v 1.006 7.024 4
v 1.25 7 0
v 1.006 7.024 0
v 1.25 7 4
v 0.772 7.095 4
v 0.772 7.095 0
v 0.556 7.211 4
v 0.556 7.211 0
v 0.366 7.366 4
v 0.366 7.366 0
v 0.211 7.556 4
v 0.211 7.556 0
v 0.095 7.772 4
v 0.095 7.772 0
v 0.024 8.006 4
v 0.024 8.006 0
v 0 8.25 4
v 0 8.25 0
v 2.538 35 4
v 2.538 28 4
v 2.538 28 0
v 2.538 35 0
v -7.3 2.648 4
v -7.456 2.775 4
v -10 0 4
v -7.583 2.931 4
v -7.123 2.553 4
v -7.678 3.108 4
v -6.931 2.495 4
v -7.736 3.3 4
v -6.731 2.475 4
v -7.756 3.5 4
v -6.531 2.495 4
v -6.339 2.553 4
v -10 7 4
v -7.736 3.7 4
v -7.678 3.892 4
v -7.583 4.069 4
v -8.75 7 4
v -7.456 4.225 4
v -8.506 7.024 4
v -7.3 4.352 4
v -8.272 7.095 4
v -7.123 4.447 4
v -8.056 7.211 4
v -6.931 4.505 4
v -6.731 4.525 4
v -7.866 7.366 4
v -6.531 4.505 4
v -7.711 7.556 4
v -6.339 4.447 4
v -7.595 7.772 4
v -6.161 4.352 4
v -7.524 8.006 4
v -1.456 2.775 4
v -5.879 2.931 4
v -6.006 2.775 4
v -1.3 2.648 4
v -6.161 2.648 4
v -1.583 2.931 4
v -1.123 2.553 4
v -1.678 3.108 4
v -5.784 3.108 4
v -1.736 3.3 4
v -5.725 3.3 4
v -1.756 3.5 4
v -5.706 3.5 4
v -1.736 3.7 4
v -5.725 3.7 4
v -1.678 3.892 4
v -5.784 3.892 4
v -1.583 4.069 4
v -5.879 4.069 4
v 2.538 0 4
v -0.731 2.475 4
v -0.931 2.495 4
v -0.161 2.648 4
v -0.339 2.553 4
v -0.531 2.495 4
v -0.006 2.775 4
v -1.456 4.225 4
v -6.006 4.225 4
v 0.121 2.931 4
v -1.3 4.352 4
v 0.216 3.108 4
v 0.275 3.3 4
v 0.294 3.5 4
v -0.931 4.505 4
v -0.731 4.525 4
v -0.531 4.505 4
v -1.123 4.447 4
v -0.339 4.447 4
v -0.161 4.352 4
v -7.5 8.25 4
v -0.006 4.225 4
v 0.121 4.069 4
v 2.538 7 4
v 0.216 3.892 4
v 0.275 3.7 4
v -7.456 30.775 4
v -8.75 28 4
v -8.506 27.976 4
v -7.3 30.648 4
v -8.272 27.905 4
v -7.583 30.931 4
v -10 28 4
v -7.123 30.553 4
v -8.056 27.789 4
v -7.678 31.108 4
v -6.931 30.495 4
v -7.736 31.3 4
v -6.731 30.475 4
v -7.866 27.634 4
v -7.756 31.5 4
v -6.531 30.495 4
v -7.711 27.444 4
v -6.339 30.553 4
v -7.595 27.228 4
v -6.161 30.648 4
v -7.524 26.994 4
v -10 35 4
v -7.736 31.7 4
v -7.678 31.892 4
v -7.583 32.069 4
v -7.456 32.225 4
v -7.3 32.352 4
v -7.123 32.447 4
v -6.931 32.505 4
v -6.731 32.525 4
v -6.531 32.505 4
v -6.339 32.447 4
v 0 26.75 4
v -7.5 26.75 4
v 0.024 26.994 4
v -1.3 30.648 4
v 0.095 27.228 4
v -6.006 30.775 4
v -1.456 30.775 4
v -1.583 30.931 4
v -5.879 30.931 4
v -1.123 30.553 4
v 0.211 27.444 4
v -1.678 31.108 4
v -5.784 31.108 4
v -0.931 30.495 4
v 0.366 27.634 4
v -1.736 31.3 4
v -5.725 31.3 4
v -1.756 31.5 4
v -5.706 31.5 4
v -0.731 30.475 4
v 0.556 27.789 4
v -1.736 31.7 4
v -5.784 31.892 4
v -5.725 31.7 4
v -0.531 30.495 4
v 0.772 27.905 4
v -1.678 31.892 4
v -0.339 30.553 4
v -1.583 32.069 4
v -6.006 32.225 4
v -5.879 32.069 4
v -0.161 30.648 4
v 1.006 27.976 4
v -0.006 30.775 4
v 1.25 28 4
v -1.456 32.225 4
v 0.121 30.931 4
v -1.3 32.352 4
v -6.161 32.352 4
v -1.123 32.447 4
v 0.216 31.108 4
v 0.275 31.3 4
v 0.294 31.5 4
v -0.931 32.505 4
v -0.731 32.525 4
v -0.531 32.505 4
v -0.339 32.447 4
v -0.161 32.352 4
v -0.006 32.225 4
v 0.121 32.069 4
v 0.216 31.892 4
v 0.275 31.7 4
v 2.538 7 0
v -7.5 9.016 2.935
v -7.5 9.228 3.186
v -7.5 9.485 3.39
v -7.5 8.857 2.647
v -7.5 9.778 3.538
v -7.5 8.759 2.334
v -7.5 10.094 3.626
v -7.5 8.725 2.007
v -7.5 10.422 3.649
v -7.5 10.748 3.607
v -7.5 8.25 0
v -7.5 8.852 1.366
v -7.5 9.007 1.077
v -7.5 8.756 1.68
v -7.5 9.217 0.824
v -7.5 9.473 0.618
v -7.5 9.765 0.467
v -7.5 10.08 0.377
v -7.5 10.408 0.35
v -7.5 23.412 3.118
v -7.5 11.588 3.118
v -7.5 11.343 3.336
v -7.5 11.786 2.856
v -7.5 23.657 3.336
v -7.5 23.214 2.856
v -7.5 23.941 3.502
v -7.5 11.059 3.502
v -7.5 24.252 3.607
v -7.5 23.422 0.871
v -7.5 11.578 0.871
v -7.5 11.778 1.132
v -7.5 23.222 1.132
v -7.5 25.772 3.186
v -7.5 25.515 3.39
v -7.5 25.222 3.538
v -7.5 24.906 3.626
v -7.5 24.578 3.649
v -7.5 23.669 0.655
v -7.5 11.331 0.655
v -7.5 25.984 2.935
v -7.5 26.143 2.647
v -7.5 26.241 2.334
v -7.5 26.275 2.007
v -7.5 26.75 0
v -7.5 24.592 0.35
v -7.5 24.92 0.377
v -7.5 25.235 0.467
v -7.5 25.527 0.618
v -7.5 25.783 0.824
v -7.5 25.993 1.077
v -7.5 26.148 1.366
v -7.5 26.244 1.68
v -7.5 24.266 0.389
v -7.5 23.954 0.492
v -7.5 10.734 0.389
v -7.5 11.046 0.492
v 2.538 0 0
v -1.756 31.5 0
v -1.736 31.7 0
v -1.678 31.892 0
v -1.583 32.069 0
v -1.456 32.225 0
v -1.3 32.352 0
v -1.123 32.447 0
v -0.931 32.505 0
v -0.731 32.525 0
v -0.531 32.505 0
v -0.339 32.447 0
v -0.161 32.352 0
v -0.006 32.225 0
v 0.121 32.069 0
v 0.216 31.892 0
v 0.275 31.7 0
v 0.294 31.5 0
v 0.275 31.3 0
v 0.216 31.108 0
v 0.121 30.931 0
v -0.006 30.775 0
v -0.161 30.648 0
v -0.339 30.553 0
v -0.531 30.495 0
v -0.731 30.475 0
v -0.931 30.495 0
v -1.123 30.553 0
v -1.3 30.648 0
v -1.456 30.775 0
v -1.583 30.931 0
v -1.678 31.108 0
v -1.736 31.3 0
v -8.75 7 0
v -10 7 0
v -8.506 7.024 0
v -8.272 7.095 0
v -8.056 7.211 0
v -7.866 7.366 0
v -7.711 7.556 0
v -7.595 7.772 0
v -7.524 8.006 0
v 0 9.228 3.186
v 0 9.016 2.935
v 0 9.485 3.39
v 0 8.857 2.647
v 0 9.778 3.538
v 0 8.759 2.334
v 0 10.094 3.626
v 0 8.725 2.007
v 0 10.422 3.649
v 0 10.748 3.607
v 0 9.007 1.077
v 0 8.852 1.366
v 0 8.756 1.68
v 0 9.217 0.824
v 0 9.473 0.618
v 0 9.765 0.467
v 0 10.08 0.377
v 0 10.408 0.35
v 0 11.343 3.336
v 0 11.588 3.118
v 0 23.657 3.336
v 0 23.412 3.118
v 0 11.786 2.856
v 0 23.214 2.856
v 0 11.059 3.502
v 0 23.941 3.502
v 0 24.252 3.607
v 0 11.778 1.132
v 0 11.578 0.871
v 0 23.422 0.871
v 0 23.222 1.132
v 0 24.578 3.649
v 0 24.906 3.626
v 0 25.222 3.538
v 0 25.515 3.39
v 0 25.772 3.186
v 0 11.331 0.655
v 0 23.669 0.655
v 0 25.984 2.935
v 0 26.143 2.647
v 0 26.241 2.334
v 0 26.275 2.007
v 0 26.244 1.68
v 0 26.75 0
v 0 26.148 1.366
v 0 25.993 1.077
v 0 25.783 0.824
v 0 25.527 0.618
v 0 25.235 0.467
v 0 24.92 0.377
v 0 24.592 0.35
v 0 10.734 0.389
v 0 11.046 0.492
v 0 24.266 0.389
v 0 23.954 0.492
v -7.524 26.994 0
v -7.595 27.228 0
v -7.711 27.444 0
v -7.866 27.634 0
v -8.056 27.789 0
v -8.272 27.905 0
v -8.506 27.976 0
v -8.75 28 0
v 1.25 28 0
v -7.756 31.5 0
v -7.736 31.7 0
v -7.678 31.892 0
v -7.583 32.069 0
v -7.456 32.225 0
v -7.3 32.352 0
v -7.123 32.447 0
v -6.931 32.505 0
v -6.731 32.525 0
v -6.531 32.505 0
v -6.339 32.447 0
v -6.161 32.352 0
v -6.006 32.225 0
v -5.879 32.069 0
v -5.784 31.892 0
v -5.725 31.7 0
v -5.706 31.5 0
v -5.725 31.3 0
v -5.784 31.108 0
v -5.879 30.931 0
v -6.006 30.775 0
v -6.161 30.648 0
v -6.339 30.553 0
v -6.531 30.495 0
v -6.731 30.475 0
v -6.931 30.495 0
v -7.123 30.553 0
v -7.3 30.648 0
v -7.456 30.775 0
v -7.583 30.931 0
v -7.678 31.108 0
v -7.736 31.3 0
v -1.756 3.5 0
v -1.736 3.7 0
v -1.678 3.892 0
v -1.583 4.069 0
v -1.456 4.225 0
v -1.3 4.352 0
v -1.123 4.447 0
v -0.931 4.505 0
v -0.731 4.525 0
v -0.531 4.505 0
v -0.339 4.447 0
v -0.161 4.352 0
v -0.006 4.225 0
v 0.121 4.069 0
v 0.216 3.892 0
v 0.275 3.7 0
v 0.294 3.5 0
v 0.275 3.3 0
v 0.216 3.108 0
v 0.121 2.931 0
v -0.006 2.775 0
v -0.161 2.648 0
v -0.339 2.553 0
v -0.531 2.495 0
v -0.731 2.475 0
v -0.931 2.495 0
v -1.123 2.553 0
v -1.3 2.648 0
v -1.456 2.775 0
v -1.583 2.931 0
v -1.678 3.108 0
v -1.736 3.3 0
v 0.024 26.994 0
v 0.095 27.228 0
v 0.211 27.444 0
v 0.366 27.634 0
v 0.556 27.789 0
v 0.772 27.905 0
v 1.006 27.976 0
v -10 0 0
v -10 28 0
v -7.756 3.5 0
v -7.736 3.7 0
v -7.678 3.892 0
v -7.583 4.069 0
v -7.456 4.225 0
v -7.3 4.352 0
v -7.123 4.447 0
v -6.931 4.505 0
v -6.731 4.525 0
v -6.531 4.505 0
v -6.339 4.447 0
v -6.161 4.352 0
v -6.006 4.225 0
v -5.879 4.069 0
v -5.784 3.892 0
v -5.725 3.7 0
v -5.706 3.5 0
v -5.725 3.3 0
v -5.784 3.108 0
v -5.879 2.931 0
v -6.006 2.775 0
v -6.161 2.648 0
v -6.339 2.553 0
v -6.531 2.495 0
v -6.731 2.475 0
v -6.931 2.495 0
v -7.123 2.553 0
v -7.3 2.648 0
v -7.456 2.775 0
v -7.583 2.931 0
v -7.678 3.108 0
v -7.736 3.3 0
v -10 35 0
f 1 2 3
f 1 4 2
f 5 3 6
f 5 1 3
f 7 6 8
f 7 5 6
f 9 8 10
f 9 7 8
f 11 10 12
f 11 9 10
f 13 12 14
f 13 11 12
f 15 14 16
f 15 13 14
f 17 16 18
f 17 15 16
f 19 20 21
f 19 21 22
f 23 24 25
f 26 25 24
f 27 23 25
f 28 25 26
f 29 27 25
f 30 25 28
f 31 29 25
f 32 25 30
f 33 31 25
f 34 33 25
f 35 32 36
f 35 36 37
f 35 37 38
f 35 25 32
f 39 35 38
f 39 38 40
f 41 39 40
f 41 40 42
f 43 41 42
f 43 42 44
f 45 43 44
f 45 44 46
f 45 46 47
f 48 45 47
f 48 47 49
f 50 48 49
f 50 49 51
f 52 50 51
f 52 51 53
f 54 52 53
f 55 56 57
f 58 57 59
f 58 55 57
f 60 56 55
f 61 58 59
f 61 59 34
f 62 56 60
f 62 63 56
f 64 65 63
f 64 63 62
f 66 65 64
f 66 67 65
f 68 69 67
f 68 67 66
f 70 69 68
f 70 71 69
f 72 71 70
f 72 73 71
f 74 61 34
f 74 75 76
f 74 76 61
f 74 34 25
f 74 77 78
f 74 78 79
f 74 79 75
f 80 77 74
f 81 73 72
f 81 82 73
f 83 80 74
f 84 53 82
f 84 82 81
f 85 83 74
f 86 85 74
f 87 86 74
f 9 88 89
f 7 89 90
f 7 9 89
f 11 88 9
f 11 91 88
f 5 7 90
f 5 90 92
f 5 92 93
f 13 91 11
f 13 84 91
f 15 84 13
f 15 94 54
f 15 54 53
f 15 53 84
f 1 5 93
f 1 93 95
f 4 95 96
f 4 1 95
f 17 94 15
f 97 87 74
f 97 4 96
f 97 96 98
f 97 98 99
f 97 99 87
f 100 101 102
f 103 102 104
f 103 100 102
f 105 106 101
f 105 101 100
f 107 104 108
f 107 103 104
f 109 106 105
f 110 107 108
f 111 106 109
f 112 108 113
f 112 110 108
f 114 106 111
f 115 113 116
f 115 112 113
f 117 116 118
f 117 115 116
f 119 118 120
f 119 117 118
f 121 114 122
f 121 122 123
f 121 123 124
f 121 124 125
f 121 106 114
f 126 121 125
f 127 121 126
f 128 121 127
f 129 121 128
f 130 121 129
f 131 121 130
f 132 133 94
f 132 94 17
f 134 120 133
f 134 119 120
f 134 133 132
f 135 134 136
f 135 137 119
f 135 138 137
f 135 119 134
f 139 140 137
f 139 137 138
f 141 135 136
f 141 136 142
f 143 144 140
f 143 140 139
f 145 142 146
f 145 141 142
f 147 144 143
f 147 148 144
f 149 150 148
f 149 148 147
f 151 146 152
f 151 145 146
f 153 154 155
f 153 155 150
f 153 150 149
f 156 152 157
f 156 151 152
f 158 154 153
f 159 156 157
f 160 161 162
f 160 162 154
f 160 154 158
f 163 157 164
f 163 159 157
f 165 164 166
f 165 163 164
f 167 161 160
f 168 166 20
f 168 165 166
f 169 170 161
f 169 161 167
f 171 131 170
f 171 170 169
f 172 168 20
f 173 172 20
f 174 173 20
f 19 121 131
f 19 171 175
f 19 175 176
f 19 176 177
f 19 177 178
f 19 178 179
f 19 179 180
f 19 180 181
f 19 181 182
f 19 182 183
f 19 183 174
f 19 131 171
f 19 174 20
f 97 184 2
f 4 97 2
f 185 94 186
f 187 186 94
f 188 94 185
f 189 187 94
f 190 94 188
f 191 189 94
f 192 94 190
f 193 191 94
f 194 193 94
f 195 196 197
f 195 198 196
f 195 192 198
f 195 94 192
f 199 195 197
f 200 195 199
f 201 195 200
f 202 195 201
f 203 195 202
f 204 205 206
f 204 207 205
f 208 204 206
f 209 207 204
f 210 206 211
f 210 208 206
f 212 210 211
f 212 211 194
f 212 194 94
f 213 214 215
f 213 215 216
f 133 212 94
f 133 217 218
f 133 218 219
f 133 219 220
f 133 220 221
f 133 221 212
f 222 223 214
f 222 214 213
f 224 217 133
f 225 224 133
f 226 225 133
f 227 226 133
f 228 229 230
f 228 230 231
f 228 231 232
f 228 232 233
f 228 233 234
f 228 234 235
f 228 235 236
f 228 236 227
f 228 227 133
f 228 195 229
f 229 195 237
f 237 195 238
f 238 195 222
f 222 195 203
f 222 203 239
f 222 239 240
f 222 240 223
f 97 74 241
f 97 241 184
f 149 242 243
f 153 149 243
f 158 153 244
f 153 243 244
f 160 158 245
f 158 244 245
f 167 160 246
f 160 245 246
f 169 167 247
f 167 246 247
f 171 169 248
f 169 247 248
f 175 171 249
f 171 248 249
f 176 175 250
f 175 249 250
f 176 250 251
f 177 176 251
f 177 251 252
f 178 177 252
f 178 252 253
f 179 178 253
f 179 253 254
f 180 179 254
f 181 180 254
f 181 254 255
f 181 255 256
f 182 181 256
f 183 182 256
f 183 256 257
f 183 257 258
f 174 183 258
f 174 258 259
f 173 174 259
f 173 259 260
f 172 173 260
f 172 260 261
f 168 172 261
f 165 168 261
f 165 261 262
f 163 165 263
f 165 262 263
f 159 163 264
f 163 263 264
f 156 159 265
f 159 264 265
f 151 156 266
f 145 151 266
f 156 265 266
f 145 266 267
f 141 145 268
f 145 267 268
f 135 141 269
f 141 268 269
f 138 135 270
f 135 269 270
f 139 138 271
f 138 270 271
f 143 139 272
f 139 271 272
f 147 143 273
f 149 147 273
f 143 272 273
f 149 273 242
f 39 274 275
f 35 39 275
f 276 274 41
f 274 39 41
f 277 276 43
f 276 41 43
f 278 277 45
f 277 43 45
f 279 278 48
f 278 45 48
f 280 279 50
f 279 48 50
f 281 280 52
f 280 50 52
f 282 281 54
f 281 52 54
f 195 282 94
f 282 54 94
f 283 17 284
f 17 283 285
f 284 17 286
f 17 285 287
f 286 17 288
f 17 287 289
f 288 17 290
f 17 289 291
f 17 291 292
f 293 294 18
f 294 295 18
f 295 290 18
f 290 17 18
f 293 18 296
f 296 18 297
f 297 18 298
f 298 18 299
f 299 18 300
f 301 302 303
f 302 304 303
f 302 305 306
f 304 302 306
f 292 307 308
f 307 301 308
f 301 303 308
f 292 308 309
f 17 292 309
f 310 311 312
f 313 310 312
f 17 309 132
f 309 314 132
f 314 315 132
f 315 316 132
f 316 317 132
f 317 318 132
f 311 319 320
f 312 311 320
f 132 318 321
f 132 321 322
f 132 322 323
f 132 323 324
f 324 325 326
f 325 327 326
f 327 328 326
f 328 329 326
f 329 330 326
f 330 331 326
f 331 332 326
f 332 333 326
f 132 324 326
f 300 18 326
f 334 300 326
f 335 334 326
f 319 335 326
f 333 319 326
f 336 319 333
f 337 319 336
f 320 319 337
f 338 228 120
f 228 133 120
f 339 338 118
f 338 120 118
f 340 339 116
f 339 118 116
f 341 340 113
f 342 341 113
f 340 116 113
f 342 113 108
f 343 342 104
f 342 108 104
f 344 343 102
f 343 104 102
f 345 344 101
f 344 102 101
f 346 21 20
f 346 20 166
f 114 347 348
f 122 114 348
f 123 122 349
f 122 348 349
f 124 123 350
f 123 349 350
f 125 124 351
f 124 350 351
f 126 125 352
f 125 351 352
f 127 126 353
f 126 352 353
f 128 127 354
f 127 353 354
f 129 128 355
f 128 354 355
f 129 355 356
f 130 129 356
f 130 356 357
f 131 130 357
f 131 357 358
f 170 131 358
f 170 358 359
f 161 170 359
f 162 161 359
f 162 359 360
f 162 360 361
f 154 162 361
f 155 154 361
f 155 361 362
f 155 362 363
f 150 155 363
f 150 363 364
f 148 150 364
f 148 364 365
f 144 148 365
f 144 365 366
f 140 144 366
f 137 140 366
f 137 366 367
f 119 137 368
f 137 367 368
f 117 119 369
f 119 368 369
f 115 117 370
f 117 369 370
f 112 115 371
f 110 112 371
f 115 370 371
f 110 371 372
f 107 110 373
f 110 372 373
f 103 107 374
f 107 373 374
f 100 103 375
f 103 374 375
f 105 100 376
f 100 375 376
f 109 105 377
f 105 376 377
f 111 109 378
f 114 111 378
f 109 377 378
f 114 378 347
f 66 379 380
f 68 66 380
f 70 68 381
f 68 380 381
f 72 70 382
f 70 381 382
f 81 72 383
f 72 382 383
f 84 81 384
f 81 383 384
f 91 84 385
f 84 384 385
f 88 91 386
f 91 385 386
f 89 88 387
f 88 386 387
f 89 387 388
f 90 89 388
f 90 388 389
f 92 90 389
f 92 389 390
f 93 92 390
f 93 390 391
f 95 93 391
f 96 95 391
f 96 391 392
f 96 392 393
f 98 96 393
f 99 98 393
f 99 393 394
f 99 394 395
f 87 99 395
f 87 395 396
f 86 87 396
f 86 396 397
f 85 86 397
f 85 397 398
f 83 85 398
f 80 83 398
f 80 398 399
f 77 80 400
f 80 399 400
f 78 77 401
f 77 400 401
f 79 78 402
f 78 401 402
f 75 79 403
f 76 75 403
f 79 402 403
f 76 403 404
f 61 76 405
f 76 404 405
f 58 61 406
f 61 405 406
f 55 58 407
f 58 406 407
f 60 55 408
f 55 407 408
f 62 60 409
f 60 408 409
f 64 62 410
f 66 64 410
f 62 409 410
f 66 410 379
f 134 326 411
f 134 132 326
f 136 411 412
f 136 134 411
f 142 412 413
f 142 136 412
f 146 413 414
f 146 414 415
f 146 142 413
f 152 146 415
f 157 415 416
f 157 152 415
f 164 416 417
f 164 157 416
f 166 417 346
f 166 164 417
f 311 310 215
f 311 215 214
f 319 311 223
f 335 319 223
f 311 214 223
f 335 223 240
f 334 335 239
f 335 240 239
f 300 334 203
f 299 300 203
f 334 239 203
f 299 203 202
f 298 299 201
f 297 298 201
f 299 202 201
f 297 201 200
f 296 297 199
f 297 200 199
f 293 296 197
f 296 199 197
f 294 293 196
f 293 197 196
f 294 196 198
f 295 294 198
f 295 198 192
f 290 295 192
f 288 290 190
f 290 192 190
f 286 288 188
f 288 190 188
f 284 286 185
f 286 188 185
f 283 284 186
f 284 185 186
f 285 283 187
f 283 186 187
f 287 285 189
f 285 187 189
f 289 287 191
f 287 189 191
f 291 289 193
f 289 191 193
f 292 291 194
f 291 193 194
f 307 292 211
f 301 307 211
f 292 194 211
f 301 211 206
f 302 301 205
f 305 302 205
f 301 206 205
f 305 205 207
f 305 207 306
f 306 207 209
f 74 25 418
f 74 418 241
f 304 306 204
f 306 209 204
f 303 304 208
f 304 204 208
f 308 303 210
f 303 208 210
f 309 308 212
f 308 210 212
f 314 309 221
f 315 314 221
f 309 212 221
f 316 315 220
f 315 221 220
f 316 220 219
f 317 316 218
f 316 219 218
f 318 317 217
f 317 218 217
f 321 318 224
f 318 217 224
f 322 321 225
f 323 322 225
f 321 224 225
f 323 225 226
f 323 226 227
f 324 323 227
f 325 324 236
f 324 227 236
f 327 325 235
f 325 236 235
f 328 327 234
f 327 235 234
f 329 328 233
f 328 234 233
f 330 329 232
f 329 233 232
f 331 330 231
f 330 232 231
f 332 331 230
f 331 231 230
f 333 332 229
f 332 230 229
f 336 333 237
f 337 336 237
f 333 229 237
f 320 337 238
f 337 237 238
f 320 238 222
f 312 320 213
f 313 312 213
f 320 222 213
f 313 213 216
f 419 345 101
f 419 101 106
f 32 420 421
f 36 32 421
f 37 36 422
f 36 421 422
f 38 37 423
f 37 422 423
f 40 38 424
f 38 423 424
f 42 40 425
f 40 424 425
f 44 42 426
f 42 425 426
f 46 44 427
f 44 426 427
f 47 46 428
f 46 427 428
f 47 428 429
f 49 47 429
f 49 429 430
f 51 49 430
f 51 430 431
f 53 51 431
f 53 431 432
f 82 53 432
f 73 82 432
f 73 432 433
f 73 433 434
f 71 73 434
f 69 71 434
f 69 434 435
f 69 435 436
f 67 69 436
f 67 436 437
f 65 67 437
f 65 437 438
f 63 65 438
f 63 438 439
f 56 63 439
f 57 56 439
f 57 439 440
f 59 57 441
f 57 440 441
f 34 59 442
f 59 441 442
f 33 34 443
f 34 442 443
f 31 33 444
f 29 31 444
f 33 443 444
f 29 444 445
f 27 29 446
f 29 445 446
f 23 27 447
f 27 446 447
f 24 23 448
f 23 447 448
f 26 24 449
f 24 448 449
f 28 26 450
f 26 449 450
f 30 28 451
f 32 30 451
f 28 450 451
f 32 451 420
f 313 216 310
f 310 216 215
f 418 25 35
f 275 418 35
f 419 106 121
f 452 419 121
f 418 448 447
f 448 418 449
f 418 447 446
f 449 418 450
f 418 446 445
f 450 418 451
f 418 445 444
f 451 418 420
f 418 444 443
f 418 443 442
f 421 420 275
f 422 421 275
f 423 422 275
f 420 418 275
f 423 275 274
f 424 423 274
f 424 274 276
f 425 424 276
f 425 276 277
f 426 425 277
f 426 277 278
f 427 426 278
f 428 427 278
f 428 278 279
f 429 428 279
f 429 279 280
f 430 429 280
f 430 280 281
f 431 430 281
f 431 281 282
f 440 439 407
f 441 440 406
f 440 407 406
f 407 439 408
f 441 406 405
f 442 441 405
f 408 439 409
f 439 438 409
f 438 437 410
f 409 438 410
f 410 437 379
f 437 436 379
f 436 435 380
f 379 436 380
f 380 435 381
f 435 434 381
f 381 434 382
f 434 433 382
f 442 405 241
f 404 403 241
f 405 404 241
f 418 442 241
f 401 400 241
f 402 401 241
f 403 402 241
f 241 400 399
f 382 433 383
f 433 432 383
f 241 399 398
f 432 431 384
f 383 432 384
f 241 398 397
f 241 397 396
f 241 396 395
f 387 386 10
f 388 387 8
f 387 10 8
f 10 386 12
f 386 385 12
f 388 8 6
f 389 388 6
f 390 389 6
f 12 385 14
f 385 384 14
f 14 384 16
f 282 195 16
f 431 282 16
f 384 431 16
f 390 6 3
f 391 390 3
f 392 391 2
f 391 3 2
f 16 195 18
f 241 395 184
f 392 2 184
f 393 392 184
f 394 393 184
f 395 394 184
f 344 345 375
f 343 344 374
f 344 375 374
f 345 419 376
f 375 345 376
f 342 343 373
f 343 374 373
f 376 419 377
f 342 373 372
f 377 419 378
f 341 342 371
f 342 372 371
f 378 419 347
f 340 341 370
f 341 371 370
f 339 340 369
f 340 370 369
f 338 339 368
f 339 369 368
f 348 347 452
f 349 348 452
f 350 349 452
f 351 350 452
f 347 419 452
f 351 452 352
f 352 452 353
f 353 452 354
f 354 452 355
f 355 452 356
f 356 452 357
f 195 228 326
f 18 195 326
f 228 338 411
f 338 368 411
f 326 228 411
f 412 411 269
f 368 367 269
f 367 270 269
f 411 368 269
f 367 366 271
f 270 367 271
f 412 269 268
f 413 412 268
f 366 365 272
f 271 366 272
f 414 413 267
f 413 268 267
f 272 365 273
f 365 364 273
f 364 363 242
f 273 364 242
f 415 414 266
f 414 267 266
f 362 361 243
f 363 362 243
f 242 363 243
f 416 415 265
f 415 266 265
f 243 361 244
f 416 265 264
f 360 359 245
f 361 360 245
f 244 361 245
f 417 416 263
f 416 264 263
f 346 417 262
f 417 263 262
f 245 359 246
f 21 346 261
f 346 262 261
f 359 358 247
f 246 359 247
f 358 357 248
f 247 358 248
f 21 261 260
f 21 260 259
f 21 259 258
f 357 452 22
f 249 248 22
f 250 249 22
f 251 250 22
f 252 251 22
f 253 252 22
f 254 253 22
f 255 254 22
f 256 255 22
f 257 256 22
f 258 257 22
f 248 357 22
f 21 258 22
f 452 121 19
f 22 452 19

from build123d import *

# Parameters (mm, degrees)
SKETCH1_W                = 12.538434267
SKETCH1_H                = 35
BOSS_EXTRUDE1_DEPTH      = 4
SKETCH2_W                = 2.5
SKETCH2_H                = 21
CUT_EXTRUDE1_DEPTH       = 5
SKETCH3_W                = 2.538434267
SKETCH3_H                = 21
CUT_EXTRUDE2_DEPTH       = 5
CUT_EXTRUDE3_DEPTH       = 11.038434267
SKETCH5_W                = 7.5
SKETCH5_H                = 1.65
SKETCH6_W                = 7.5
SKETCH6_H                = 1.65
M2_5X0_45_TAPPED_HOLE1_D = 2.05
FILLET1_R                = 1.25


with BuildPart() as part:
    # Sketch1 → Boss-Extrude1 (new body)
    with BuildSketch(Plane.XY.offset(4)):
        with Locations((-3.730782867, 17.5)):
            Rectangle(SKETCH1_W, SKETCH1_H)
    extrude(amount=-BOSS_EXTRUDE1_DEPTH)

    # Sketch2 → Cut-Extrude1 (cut, through all)
    with BuildSketch(Plane(origin=(0, 0, 0), x_dir=(-1, 0, 0), z_dir=(0, 0, -1))):
        with Locations((8.75, 17.5)):
            Rectangle(SKETCH2_W, SKETCH2_H)
    extrude(amount=-CUT_EXTRUDE1_DEPTH, mode=Mode.SUBTRACT)

    # Sketch3 → Cut-Extrude2 (cut, through all)
    with BuildSketch(Plane(origin=(0, 0, 0), x_dir=(-1, 0, 0), z_dir=(0, 0, -1))):
        with Locations((-1.269217133, 17.5)):
            Rectangle(SKETCH3_W, SKETCH3_H)
    extrude(amount=-CUT_EXTRUDE2_DEPTH, mode=Mode.SUBTRACT)

    # Sketch4 → Cut-Extrude3 (cut, through all)
    with BuildSketch(Plane.ZY.offset(7.5)):
        with BuildLine():
            Line((2.855933763, 11.78563014), (2.855933763, 23.21436986))
            ThreePointArc((2.855933763, 23.21436986), (1.992824856, 22.975015601), (1.13183027, 23.221867319))
            Line((1.13183027, 23.221867319), (1.13183027, 11.778132681))
            ThreePointArc((1.13183027, 11.778132681), (1.992824856, 12.024984399), (2.855933763, 11.78563014))
        make_face()
    extrude(amount=-CUT_EXTRUDE3_DEPTH, mode=Mode.SUBTRACT)

    # Sketch5 → Cut-Revolve1 (revolve, cut)
    with BuildSketch(Plane(origin=(0, 0, 2), x_dir=(-1, 0, 0), z_dir=(0, 0, -1))):
        with Locations((3.75, 25.45)):
            Rectangle(SKETCH5_W, SKETCH5_H)
    revolve(axis=Axis((0, 24.625, 2), (-1, 0, 0)), mode=Mode.SUBTRACT)

    # Sketch6 → Cut-Revolve2 (revolve, cut)
    with BuildSketch(Plane(origin=(0, 0, 2), x_dir=(-1, 0, 0), z_dir=(0, 0, -1))):
        with Locations((3.75, 11.2)):
            Rectangle(SKETCH6_W, SKETCH6_H)
    revolve(axis=Axis((0, 10.375, 2), (-1, 0, 0)), mode=Mode.SUBTRACT)

    # M2.5x0.45 Tapped Hole1 (through all)
    with Locations(Plane.XY.offset(4)):
        with Locations((-0.730782866, 3.5), (-6.730782866, 3.5), (-0.730782866, 31.5), (-6.730782866, 31.5)):
            Hole(M2_5X0_45_TAPPED_HOLE1_D / 2)

    # Fillet1
    fillet1_edges = [part.edges().sort_by_distance(p)[0] for p in [
        (-7.5, 7, 2),
        (-7.5, 28, 2),
        (0, 28, 2),
        (0, 7, 2),
    ]]
    fillet(fillet1_edges, radius=FILLET1_R)


solid = part.part
